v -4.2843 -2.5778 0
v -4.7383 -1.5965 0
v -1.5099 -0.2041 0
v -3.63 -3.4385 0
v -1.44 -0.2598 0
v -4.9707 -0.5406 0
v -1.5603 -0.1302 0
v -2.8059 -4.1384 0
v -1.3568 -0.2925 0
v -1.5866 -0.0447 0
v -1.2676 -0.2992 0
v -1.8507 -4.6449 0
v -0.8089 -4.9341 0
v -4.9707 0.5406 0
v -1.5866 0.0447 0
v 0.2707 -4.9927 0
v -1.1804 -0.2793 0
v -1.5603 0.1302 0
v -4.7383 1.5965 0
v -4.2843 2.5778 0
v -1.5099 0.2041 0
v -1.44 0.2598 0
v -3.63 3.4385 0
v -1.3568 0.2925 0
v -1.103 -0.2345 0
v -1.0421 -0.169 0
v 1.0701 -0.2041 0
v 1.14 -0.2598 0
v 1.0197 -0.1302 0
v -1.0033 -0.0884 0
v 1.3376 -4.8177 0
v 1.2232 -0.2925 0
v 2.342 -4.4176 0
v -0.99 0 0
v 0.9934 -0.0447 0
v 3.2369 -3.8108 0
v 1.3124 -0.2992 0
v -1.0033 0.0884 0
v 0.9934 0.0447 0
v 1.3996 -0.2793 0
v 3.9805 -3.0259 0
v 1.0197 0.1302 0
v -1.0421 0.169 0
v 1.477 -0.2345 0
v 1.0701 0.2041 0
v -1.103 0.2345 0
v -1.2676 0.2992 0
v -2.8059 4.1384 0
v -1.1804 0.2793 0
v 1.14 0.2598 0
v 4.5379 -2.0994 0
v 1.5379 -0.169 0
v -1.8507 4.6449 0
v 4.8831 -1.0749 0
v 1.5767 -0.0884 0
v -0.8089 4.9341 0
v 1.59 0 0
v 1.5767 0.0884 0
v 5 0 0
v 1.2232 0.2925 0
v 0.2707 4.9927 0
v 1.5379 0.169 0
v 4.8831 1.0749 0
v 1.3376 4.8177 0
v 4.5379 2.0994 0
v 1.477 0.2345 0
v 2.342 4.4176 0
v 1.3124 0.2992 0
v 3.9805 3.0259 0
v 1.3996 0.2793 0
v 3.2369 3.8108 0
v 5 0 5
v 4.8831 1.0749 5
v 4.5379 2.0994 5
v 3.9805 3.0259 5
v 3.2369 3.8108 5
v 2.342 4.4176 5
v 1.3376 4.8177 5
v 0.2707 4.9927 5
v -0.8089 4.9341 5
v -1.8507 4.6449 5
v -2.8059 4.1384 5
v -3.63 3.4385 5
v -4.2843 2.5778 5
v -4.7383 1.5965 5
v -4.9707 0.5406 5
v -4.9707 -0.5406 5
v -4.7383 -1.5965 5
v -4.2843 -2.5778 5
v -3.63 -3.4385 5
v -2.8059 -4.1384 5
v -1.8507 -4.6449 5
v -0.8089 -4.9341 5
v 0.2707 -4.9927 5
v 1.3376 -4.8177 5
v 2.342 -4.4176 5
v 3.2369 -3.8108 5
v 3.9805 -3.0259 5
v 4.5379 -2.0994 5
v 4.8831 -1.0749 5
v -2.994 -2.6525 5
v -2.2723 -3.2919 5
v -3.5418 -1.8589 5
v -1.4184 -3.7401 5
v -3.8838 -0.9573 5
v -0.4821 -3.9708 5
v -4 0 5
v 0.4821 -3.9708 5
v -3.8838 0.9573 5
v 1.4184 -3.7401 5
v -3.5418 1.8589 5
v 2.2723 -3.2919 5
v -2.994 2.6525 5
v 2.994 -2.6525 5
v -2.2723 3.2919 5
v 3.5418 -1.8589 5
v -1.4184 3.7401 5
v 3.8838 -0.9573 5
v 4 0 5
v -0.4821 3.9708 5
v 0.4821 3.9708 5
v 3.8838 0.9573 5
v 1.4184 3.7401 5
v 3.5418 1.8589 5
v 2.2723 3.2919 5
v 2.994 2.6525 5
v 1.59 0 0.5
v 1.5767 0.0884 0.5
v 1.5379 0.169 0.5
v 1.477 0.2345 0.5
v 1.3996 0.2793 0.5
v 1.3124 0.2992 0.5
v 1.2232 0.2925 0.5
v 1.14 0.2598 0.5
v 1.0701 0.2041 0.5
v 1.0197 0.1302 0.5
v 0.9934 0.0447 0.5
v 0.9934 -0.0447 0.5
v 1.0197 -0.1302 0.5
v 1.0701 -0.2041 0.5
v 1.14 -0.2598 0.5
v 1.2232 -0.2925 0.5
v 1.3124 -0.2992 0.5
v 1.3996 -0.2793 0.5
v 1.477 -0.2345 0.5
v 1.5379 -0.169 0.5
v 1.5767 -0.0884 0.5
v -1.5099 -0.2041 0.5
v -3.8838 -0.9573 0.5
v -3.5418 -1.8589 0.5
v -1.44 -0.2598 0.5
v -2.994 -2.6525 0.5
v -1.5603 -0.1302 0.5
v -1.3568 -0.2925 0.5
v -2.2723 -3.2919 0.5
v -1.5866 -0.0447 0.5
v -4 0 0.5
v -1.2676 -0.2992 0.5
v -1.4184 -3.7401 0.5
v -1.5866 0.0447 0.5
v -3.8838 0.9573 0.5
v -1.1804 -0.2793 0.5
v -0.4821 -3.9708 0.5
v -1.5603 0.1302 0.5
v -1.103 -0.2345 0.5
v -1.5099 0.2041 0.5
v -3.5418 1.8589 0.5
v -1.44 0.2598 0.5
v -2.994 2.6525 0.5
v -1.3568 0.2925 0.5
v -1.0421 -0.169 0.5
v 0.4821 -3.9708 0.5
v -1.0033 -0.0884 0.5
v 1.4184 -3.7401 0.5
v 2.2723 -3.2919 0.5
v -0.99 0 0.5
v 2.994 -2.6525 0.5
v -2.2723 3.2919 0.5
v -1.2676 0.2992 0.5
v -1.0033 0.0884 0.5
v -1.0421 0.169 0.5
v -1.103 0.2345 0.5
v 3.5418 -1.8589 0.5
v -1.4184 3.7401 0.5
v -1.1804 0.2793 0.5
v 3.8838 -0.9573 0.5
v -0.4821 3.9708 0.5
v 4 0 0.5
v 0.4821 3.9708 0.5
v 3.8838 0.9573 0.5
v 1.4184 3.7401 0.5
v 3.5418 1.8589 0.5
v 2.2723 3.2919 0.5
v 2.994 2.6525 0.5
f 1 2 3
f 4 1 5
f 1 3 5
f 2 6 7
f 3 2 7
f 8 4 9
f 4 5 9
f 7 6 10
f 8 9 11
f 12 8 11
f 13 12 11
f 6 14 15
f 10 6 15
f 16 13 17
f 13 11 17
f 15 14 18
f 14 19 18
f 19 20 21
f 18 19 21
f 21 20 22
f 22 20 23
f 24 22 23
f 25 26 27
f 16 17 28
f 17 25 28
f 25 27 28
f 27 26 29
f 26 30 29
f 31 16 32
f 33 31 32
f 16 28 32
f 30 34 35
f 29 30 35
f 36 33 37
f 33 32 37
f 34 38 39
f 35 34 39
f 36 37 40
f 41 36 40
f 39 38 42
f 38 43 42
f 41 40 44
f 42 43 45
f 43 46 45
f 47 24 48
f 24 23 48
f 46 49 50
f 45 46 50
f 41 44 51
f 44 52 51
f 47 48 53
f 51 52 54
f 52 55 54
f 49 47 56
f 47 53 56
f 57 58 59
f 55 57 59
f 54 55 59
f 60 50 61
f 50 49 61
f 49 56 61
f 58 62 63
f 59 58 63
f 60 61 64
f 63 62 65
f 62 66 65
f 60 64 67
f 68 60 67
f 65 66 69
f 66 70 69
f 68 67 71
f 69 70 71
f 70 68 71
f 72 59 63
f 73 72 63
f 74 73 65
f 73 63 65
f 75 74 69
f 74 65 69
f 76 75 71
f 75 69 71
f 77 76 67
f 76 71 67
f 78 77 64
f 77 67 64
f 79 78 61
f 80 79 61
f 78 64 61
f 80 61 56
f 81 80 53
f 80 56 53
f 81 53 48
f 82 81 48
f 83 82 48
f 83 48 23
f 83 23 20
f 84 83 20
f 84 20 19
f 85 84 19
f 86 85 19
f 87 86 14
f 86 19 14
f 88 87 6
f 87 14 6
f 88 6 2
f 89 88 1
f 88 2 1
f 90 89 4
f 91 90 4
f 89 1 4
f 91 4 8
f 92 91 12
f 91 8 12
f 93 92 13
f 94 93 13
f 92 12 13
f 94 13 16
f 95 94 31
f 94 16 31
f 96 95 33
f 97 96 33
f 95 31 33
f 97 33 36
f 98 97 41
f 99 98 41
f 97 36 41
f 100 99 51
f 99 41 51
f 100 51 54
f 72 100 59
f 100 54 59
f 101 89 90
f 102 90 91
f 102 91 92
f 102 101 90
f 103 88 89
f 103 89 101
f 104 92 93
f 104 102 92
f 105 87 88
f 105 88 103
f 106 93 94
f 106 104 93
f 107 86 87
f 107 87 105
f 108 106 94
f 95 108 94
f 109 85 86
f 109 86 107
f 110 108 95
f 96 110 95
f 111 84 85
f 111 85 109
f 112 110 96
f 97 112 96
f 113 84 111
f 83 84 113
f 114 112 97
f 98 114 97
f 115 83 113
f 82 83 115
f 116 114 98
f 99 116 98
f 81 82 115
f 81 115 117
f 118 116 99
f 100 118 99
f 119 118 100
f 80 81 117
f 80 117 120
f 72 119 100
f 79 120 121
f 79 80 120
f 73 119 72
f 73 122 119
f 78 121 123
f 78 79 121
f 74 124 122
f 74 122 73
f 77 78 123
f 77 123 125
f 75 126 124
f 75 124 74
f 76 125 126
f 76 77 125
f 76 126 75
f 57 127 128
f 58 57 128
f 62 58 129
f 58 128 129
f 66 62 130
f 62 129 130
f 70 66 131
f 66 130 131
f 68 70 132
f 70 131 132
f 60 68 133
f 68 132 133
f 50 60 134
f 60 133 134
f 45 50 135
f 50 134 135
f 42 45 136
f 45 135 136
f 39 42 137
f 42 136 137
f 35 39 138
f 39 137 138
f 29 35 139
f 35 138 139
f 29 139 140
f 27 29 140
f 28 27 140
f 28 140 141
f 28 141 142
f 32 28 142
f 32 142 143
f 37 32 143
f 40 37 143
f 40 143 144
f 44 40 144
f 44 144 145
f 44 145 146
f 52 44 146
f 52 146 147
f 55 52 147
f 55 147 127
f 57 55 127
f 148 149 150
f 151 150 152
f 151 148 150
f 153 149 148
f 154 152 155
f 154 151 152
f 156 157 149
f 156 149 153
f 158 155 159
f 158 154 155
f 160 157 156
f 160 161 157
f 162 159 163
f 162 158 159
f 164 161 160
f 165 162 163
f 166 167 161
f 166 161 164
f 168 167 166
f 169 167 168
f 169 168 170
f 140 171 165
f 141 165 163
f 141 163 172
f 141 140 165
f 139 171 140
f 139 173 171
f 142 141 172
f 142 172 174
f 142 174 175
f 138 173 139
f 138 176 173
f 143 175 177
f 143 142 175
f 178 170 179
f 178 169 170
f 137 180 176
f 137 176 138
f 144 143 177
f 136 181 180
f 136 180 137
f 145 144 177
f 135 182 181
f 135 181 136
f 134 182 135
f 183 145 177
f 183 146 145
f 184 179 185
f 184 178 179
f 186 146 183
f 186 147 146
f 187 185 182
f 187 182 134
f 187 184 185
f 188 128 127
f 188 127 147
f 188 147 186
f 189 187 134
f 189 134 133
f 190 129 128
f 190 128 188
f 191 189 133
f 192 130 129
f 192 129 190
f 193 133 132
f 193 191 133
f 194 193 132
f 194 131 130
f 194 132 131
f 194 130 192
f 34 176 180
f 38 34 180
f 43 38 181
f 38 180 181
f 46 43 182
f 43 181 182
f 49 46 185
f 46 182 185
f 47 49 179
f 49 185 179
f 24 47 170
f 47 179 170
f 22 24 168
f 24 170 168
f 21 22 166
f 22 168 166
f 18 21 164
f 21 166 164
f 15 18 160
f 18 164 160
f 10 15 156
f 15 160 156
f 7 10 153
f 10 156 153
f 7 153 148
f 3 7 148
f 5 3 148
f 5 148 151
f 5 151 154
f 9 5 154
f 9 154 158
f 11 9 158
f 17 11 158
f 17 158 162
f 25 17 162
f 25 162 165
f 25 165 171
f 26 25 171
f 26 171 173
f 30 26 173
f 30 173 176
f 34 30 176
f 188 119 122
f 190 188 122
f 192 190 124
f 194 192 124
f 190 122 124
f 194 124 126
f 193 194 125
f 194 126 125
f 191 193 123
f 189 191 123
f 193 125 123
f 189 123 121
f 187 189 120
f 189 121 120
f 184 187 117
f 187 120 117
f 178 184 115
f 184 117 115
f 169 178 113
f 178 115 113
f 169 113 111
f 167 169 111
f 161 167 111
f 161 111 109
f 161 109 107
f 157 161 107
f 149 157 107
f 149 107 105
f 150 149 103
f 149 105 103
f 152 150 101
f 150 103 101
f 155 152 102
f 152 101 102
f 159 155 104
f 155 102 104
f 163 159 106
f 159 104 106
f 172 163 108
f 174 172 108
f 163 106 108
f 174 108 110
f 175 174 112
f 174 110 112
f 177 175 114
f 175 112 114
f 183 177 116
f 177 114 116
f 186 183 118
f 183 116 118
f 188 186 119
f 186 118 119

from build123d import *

# Parameters (mm, degrees)
SKETCH1_R           = 5
BOSS_EXTRUDE1_DEPTH = 5
SKETCH3_R           = 4
CUT_EXTRUDE1_DEPTH  = 4.5
SKETCH4_R           = 0.3
CUT_EXTRUDE2_DEPTH  = 9.381527307


with BuildPart() as part:
    # Sketch1 → Boss-Extrude1 (new body)
    with BuildSketch(Plane.XY):
        Circle(SKETCH1_R)
    extrude(amount=BOSS_EXTRUDE1_DEPTH)

    # Sketch3 → Cut-Extrude1 (cut)
    with BuildSketch(Plane.XY.offset(5)):
        Circle(SKETCH3_R)
    extrude(amount=-CUT_EXTRUDE1_DEPTH, mode=Mode.SUBTRACT)

    # Sketch4 → Cut-Extrude2 (cut, through all)
    with BuildSketch(Plane.XY.offset(0.5)):
        with Locations((1.29, 0)):
            Circle(SKETCH4_R)
        with Locations((-1.29, 0)):
            Circle(SKETCH4_R)
    extrude(amount=-CUT_EXTRUDE2_DEPTH, mode=Mode.SUBTRACT)


solid = part.part
